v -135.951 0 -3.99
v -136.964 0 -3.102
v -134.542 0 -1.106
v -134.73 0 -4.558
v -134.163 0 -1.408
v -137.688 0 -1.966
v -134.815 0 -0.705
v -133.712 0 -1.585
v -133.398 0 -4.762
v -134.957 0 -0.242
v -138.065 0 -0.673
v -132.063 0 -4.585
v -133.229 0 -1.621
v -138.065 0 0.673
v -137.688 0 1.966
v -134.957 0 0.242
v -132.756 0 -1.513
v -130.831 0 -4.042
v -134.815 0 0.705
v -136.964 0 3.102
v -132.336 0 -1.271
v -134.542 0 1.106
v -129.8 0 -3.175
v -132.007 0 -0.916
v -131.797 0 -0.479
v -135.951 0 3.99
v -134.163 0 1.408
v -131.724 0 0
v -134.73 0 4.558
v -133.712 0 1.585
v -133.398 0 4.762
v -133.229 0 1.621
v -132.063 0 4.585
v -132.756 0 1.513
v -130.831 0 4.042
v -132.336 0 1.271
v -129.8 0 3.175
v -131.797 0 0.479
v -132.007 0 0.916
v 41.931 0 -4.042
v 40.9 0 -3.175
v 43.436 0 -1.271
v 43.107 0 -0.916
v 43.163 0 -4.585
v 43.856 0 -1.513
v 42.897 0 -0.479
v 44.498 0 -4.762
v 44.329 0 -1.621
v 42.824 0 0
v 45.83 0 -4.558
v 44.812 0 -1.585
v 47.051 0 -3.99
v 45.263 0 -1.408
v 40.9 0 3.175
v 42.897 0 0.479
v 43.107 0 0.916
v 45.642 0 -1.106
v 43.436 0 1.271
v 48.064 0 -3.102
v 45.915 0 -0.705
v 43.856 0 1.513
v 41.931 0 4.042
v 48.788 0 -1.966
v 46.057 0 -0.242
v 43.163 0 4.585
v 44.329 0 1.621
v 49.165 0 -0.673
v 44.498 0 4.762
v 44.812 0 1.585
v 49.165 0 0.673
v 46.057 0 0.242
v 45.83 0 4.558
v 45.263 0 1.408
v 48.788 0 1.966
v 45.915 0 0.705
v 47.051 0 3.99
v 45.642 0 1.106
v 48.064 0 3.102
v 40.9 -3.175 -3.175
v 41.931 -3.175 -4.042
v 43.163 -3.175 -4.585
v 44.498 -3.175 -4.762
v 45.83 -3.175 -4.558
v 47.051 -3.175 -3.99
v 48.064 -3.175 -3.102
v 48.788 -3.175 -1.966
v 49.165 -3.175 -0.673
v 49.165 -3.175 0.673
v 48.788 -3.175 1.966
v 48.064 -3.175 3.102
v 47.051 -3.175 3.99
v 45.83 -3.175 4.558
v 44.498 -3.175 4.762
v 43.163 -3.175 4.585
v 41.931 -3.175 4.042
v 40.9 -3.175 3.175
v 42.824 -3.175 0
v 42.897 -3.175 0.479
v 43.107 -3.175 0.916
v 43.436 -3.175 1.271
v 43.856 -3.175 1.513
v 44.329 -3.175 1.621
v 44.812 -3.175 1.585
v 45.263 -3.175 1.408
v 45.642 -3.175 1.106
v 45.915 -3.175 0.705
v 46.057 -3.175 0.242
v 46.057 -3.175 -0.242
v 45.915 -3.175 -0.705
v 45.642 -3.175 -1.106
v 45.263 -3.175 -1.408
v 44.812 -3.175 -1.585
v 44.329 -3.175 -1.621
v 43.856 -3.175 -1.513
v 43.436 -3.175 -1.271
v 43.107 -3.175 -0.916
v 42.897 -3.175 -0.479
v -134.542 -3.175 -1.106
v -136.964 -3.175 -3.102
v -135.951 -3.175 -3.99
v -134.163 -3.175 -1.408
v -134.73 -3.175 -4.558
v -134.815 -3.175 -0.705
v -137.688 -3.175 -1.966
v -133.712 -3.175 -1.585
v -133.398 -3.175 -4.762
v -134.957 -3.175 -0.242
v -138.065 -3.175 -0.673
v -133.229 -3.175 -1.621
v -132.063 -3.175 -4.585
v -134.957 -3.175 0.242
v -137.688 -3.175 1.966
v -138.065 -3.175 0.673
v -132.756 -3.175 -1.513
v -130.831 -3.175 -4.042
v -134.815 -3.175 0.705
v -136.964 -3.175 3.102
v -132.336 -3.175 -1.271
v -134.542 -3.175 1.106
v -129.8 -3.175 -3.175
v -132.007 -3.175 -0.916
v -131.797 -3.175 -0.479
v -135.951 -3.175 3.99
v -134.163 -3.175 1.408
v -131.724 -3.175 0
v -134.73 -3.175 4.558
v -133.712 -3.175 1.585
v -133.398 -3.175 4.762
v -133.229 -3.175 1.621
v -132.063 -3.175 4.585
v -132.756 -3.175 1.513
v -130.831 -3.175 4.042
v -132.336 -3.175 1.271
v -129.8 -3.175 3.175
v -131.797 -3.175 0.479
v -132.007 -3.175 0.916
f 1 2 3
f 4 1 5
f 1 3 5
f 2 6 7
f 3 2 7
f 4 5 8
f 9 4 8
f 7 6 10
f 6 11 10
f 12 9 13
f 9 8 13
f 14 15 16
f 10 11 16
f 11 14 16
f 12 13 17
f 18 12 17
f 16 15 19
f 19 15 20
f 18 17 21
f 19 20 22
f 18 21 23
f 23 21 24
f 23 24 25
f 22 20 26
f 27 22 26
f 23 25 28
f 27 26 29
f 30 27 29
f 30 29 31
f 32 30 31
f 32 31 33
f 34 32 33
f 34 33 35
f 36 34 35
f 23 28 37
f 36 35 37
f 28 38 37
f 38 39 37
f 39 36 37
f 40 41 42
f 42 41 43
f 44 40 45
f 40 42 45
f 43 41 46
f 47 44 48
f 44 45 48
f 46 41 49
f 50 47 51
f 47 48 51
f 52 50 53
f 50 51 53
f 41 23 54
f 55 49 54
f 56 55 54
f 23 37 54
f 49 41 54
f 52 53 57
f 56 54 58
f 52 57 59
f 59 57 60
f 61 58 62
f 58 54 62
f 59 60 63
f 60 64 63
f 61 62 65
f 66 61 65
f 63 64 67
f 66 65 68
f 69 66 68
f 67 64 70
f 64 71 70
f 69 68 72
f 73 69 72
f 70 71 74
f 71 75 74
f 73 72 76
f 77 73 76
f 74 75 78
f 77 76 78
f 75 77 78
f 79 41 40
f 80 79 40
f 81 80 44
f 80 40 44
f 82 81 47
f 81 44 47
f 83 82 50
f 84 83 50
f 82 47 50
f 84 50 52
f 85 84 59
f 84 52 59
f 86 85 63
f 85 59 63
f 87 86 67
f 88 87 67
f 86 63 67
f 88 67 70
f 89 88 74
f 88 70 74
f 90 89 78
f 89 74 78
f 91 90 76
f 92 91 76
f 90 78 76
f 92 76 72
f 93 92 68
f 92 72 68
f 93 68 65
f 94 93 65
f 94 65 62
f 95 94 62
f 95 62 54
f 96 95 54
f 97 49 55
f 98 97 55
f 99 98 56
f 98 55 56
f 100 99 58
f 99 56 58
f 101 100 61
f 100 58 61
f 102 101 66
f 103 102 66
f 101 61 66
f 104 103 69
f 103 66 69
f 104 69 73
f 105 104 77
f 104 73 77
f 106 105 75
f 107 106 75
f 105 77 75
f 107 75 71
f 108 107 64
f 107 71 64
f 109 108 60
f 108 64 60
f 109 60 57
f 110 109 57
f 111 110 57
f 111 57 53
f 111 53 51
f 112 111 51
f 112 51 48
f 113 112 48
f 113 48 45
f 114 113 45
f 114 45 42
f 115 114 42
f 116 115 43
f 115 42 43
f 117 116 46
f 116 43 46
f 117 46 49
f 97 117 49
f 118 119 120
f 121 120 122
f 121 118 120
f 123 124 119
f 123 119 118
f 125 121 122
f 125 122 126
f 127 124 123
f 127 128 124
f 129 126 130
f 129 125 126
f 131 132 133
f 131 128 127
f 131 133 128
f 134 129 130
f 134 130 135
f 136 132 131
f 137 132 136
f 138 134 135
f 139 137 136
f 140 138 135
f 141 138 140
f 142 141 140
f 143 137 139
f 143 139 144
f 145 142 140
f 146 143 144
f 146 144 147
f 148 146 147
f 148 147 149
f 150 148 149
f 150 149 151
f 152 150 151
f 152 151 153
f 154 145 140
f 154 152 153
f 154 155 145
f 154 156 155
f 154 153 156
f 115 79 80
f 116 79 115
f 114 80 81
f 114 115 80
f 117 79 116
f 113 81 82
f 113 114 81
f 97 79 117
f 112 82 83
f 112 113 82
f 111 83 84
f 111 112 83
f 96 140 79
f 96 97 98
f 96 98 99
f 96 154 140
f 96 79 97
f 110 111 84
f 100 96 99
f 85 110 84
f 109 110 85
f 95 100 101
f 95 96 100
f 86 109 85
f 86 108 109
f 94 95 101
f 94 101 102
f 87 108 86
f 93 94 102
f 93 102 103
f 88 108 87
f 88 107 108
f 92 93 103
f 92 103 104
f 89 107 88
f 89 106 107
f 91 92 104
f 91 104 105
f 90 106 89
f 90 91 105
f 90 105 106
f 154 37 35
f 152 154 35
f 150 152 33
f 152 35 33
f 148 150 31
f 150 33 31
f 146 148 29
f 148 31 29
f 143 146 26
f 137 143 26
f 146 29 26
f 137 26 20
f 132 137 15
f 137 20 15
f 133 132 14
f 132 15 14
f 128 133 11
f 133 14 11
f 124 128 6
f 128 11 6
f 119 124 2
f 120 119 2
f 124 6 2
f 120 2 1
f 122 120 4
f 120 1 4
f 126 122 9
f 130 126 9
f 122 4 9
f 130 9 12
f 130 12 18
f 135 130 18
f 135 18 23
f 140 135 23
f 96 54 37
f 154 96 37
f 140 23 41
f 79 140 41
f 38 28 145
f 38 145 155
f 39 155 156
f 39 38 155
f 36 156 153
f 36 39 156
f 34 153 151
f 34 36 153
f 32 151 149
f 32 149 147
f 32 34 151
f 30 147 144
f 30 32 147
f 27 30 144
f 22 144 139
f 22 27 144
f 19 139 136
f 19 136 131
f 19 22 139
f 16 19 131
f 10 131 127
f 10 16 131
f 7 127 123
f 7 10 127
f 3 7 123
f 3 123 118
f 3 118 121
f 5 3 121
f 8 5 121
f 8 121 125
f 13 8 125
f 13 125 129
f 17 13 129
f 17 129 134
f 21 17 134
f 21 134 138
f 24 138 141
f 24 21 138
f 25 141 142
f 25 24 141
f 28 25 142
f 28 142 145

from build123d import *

# Parameters (mm, degrees)
F0_R     = 1.6256
F1_DEPTH = 3.175


with BuildPart() as f1:
    # F0 (on Front) → F1 (new body)
    with BuildSketch(Plane.XZ):
        with BuildLine():
            Line((0, -3.175), (0, 0))
            Line((0, 0), (0, 3.175))
            Line((0, 3.175), (-40.9002420857, 3.175))
            Line((-40.9002420857, 3.175), (-44.45, 3.175))
            Line((-44.45, 3.175), (-44.45, 1.6256))
            ThreePointArc((-44.45, 1.6256), (-43.3005272165, 1.1494727835), (-42.8244, 0))
            ThreePointArc((-42.8244, 0), (-43.3005272165, -1.1494727835), (-44.45, -1.6256))
            Line((-44.45, -1.6256), (-44.45, -3.175))
            Line((-44.45, -3.175), (-40.9002420857, -3.175))
            Line((-40.9002420857, -3.175), (0, -3.175))
        make_face()
        with BuildLine():
            Line((0, 3.175), (0, 0))
            Line((0, 0), (0, -3.175))
            Line((0, -3.175), (40.9002420857, -3.175))
            ThreePointArc((40.9002420857, -3.175), (49.2125, 0), (40.9002420857, 3.175))
            Line((40.9002420857, 3.175), (0, 3.175))
        make_face()
        with BuildLine():
            ThreePointArc((46.0756, 0), (44.45, -1.6256), (42.8244, 0))
            ThreePointArc((42.8244, 0), (44.45, 1.6256), (46.0756, 0))
        make_face(mode=Mode.SUBTRACT)
        with BuildLine():
            ThreePointArc((-47.9997579143, -3.175), (-49.2125, 0), (-47.9997579143, 3.175))
            Line((-47.9997579143, 3.175), (-88.9, 3.175))
            Line((-88.9, 3.175), (-129.8002420857, 3.175))
            ThreePointArc((-129.8002420857, 3.175), (-138.1125, 0), (-129.8002420857, -3.175))
            Line((-129.8002420857, -3.175), (-88.9, -3.175))
            Line((-88.9, -3.175), (-47.9997579143, -3.175))
        make_face()
        with Locations((-133.35, 0)):
            Circle(F0_R, mode=Mode.SUBTRACT)
        with BuildLine():
            Line((-44.45, 1.6256), (-44.45, 3.175))
            Line((-44.45, 3.175), (-47.9997579143, 3.175))
            ThreePointArc((-47.9997579143, 3.175), (-49.2125, 0), (-47.9997579143, -3.175))
            Line((-47.9997579143, -3.175), (-44.45, -3.175))
            Line((-44.45, -3.175), (-44.45, -1.6256))
            ThreePointArc((-44.45, -1.6256), (-46.0756, 0), (-44.45, 1.6256))
        make_face()
        with BuildLine():
            Line((-44.45, -1.6256), (-44.45, 1.6256))
            ThreePointArc((-44.45, 1.6256), (-46.0756, 0), (-44.45, -1.6256))
        make_face()
        with BuildLine():
            ThreePointArc((-42.8244, 0), (-43.3005272165, 1.1494727835), (-44.45, 1.6256))
            Line((-44.45, 1.6256), (-44.45, -1.6256))
            ThreePointArc((-44.45, -1.6256), (-43.3005272165, -1.1494727835), (-42.8244, 0))
        make_face()
    extrude(amount=F1_DEPTH)


solid = f1.part
